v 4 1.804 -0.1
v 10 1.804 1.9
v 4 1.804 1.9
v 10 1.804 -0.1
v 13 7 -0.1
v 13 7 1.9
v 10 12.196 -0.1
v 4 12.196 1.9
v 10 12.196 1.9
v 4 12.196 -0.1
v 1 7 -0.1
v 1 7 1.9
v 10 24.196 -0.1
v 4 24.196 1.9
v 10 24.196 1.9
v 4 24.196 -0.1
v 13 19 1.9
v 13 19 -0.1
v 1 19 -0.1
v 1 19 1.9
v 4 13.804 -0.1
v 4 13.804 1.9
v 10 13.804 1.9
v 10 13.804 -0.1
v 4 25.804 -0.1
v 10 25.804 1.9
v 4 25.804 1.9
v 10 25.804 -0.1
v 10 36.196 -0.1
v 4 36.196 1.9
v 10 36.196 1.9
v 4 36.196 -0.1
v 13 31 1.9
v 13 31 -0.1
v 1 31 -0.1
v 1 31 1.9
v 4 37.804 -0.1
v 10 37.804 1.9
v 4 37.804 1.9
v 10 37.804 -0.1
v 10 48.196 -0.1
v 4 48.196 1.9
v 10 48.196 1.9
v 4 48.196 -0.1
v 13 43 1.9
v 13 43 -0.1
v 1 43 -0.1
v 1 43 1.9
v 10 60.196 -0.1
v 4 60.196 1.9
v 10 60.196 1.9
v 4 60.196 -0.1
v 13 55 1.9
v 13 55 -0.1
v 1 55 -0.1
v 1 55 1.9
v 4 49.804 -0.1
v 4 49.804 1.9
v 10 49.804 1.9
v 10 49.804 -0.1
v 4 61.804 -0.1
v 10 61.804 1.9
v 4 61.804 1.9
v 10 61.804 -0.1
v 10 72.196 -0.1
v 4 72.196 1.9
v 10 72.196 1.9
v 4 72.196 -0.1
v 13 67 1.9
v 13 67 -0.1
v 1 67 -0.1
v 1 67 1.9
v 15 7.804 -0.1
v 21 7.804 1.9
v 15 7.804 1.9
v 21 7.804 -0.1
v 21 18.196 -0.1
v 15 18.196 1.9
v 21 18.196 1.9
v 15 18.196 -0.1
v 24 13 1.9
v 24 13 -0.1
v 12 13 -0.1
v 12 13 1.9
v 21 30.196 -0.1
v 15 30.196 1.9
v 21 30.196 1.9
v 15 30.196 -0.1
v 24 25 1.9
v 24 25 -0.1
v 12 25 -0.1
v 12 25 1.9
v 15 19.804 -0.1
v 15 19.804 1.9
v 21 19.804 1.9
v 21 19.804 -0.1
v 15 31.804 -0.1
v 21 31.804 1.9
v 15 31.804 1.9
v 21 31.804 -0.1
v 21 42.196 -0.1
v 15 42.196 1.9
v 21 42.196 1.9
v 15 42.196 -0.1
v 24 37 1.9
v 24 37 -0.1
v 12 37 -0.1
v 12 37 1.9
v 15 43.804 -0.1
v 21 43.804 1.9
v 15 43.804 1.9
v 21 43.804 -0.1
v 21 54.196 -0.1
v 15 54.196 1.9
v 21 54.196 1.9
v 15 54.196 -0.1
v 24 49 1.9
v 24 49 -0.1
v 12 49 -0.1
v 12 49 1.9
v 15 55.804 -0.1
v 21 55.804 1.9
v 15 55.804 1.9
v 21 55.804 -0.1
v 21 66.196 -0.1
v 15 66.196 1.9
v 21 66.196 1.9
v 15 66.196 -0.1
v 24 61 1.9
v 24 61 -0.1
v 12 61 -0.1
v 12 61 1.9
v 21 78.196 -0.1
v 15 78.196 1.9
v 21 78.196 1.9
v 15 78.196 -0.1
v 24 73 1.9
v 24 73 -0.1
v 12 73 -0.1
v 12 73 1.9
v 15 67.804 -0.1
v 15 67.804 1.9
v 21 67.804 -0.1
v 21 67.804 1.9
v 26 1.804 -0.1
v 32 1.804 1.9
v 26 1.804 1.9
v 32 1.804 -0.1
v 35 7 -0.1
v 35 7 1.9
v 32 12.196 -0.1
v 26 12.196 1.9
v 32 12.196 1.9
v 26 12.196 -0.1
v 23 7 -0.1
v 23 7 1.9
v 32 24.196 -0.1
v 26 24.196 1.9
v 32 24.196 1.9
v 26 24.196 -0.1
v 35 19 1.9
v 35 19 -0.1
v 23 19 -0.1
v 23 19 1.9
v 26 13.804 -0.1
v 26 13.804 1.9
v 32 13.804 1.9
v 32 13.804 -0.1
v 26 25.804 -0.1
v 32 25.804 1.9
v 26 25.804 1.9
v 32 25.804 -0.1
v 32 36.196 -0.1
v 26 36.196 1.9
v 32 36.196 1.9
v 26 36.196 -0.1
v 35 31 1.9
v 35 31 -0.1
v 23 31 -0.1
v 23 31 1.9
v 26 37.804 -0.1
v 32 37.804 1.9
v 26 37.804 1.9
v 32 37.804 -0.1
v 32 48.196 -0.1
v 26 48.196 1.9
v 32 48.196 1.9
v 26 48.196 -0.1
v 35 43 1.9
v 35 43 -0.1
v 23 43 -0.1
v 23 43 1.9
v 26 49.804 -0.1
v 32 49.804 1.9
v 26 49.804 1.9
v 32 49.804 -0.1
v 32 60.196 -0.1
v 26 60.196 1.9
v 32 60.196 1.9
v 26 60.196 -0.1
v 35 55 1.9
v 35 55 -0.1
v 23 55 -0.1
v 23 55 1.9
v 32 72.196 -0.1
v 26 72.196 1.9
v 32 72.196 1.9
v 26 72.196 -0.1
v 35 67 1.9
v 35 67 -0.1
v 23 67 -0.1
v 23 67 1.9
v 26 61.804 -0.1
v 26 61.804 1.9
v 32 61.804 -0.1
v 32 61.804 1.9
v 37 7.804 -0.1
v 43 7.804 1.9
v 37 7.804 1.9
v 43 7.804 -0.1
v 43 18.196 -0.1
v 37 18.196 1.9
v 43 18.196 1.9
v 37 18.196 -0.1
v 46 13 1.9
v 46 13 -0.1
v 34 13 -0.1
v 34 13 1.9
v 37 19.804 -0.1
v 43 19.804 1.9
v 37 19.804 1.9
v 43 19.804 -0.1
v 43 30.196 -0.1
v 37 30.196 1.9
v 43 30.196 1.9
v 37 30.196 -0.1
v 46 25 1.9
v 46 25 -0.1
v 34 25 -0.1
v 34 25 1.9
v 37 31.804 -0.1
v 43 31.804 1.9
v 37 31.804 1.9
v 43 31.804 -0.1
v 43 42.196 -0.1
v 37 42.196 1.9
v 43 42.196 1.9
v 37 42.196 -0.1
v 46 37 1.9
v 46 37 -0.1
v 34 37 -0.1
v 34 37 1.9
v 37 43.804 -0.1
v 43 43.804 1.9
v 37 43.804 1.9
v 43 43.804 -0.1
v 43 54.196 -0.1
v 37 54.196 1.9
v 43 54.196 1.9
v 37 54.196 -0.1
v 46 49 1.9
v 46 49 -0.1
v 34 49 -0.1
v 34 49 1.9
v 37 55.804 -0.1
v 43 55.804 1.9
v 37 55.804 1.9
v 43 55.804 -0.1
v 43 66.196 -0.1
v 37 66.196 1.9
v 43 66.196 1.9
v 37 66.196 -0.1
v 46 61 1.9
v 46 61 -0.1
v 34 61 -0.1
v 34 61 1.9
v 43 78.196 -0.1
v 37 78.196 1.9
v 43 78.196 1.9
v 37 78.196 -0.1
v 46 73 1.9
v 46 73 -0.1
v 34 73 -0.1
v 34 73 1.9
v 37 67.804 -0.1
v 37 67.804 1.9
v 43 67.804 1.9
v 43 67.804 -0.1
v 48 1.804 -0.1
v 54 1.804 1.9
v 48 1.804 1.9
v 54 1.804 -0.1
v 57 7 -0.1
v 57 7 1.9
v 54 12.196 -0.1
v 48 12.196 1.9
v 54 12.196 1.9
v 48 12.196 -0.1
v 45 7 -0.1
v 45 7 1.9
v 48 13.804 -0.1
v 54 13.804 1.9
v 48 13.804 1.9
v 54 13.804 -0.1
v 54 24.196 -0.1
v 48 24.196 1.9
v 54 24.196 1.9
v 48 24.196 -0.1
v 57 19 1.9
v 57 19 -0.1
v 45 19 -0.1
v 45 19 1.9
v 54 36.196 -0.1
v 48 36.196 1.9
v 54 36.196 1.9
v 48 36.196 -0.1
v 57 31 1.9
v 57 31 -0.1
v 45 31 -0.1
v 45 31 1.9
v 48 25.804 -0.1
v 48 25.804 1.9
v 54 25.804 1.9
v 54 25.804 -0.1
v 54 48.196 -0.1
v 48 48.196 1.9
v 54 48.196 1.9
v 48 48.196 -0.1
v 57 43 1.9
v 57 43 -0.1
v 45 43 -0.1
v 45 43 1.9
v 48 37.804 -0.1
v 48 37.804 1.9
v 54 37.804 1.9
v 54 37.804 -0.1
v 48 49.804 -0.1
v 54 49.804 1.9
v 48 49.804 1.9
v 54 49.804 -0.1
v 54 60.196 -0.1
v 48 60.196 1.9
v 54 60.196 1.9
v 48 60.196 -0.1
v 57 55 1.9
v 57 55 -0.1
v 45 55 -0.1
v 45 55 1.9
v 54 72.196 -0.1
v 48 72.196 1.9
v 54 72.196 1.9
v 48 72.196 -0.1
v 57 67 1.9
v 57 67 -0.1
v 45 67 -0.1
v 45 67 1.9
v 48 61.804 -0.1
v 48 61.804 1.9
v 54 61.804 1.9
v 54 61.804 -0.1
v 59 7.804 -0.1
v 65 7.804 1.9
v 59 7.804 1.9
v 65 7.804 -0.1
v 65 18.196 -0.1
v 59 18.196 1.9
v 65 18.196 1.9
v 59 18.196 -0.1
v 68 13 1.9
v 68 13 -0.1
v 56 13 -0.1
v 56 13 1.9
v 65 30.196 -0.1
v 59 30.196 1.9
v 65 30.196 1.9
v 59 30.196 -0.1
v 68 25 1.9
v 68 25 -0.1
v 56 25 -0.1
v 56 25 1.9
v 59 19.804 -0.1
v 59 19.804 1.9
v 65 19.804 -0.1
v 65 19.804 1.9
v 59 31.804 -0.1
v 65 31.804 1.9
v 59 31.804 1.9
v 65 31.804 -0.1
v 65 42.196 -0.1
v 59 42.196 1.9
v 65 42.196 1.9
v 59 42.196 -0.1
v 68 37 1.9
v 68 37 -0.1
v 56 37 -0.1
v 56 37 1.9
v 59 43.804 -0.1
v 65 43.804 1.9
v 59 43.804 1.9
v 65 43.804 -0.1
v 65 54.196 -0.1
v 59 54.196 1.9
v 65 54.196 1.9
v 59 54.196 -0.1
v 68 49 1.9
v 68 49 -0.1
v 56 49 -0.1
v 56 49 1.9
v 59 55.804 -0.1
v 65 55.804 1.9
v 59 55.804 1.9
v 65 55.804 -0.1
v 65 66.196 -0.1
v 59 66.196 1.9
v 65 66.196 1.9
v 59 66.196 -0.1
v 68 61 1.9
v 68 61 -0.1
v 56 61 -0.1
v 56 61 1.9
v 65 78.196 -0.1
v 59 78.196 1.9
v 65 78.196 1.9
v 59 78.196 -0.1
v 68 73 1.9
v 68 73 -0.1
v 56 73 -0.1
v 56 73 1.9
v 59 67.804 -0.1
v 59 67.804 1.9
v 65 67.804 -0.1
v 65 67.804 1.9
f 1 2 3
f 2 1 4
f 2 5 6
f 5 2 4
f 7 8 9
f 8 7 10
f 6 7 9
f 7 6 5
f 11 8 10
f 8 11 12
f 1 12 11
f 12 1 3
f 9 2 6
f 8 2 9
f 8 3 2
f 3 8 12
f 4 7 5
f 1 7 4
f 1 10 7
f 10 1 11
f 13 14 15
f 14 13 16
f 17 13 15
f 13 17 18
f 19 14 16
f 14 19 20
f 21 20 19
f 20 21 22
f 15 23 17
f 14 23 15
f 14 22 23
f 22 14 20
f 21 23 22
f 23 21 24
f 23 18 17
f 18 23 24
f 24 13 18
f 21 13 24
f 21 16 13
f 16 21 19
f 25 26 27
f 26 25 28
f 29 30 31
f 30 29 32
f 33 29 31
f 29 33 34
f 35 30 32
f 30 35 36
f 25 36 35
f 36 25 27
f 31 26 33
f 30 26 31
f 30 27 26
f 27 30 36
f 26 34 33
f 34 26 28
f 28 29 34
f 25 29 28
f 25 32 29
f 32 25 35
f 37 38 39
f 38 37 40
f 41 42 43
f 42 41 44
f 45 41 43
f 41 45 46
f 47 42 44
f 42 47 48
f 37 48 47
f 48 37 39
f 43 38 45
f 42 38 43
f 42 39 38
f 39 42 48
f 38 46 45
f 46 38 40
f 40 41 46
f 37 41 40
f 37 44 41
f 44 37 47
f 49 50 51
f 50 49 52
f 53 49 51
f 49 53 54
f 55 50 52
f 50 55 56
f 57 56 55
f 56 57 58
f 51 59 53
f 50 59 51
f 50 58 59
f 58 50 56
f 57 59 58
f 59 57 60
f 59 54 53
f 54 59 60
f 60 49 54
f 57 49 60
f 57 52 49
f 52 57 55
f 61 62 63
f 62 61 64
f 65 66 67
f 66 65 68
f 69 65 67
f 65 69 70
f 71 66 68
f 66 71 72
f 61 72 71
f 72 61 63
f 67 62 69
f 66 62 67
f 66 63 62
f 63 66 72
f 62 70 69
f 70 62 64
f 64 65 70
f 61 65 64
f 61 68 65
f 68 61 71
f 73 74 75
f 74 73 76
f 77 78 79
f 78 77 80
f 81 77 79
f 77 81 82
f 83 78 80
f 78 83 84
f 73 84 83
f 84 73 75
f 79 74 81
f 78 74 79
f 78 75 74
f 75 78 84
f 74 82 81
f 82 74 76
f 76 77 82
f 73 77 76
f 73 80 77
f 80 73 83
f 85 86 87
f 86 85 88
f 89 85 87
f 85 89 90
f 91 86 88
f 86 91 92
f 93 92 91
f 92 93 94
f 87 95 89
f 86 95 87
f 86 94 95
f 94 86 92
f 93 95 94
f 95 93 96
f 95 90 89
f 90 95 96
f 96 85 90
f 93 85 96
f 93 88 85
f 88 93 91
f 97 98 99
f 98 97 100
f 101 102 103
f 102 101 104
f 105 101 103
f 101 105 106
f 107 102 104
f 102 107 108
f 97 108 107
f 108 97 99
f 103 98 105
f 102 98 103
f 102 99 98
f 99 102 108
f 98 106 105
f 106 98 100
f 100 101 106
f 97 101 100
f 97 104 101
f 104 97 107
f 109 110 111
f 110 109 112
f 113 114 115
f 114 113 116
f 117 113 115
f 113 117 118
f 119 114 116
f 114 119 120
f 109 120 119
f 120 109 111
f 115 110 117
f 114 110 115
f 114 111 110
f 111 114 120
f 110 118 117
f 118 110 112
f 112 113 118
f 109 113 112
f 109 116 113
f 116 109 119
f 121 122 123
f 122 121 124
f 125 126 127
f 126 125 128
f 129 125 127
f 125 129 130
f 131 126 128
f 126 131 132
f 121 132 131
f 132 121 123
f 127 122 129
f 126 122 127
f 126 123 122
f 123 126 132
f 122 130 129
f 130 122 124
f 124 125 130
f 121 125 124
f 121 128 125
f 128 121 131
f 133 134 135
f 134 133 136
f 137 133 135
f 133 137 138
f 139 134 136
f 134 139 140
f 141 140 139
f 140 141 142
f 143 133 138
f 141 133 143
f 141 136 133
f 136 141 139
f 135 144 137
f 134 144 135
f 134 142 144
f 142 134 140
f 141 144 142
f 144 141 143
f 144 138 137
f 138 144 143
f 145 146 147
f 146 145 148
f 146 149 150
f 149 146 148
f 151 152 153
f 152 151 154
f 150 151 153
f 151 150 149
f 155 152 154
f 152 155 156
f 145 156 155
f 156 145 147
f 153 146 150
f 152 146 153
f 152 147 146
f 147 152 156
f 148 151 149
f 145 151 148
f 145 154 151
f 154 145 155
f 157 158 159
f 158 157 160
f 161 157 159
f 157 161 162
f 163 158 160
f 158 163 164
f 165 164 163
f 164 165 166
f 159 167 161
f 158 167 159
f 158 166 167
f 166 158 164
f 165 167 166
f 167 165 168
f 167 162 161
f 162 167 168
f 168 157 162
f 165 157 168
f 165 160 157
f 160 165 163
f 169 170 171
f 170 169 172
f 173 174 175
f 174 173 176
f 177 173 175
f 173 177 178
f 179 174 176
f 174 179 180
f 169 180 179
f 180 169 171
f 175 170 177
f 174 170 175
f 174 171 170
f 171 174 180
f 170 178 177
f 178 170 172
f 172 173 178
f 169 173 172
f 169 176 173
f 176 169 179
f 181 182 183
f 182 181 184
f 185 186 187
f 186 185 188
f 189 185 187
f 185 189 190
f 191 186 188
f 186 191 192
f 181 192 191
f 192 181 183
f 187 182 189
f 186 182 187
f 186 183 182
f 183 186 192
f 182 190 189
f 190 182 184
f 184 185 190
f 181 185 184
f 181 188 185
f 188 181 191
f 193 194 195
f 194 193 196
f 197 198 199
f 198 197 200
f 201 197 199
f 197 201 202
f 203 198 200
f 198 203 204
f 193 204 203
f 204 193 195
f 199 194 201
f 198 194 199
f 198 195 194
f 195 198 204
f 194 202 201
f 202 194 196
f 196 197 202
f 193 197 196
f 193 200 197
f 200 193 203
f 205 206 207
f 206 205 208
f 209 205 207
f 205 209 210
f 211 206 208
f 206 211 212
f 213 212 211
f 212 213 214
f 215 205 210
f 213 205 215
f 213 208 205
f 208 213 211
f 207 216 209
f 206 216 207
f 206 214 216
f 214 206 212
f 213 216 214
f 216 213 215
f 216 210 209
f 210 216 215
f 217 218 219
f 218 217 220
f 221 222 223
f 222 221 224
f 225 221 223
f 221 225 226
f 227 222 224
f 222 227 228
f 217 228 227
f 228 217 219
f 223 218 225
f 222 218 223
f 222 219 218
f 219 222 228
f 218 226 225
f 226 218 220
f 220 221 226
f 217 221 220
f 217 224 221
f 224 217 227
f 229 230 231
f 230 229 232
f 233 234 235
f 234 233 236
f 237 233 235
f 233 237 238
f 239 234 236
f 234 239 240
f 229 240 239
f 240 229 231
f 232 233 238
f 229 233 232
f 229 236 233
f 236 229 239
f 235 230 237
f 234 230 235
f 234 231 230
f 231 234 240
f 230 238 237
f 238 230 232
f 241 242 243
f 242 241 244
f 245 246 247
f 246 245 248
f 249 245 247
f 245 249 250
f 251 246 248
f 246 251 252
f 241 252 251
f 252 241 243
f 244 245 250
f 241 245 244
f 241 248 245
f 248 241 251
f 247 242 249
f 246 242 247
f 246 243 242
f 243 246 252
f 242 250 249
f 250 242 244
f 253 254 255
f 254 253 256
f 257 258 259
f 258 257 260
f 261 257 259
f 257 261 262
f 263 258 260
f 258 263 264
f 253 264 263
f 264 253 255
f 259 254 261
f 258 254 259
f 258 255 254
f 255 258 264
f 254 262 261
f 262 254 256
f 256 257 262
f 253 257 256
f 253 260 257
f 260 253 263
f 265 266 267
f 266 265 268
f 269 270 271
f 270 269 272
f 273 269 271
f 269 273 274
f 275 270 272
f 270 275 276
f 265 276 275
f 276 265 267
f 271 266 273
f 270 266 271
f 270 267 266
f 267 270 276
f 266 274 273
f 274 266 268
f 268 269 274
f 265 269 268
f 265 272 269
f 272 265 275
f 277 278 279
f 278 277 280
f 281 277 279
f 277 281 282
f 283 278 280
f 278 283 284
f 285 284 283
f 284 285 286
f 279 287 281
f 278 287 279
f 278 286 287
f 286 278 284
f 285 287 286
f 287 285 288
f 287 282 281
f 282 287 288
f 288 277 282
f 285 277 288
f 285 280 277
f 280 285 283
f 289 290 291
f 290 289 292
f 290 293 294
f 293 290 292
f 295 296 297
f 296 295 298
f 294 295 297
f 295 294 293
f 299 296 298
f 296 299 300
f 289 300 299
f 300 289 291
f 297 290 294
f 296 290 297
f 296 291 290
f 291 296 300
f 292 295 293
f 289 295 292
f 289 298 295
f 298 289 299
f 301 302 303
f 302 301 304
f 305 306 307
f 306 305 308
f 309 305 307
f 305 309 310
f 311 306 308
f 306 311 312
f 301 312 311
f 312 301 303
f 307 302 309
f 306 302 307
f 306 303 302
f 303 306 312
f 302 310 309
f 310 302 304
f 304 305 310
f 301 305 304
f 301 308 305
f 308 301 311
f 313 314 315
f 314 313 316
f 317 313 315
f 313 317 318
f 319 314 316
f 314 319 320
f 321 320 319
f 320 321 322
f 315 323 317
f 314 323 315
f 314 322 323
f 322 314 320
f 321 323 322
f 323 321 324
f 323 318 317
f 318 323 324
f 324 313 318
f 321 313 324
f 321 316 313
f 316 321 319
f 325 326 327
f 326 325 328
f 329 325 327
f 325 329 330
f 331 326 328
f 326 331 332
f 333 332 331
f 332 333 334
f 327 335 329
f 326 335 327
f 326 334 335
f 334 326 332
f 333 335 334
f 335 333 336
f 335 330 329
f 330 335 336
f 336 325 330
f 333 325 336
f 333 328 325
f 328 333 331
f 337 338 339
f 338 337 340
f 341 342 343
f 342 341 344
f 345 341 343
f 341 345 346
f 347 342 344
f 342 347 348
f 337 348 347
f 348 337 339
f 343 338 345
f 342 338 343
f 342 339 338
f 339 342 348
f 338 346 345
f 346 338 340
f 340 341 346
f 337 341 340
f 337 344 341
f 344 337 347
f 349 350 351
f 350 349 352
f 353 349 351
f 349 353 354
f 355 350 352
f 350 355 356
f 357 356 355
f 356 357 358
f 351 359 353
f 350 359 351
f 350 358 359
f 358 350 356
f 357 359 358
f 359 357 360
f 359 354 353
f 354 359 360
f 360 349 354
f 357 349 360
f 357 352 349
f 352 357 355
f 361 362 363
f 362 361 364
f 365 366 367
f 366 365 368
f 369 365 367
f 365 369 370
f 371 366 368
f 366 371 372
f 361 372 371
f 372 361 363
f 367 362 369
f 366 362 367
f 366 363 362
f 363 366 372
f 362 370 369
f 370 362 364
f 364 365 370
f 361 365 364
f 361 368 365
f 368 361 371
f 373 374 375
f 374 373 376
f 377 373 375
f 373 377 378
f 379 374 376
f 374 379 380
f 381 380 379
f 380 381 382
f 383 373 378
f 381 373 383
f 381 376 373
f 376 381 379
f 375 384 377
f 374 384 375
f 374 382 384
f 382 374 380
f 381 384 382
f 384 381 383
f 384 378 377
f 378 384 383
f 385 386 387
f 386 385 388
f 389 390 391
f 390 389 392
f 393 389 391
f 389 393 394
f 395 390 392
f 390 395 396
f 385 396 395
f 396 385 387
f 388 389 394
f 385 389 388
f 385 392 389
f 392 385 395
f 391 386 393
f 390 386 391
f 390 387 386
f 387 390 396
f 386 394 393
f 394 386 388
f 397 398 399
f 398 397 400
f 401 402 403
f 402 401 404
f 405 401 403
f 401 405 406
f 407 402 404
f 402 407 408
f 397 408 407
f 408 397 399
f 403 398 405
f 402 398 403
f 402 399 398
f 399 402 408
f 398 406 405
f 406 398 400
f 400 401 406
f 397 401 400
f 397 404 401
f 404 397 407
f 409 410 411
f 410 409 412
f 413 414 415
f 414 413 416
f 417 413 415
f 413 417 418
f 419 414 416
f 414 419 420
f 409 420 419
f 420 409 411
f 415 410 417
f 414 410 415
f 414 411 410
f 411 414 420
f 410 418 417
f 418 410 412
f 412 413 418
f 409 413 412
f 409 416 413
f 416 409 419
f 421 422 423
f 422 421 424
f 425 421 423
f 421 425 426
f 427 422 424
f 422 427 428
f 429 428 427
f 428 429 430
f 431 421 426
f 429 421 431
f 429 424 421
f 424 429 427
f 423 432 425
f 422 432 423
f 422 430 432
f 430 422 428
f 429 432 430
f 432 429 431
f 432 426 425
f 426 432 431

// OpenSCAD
koko=12;
korkeus=2;
kpl=5;
vali=12;

//difference() {
//  cube([84,97,2]);
  translate([7,7,0])
    for (x=[0:kpl])
      for (y=[0:kpl]) {
	y2=vali*y+(x%2)*vali/2;
	translate([x*(vali-1),y2,-0.1])
	  cylinder(d=koko,h=korkeus,$fn=6);
  }
//}
